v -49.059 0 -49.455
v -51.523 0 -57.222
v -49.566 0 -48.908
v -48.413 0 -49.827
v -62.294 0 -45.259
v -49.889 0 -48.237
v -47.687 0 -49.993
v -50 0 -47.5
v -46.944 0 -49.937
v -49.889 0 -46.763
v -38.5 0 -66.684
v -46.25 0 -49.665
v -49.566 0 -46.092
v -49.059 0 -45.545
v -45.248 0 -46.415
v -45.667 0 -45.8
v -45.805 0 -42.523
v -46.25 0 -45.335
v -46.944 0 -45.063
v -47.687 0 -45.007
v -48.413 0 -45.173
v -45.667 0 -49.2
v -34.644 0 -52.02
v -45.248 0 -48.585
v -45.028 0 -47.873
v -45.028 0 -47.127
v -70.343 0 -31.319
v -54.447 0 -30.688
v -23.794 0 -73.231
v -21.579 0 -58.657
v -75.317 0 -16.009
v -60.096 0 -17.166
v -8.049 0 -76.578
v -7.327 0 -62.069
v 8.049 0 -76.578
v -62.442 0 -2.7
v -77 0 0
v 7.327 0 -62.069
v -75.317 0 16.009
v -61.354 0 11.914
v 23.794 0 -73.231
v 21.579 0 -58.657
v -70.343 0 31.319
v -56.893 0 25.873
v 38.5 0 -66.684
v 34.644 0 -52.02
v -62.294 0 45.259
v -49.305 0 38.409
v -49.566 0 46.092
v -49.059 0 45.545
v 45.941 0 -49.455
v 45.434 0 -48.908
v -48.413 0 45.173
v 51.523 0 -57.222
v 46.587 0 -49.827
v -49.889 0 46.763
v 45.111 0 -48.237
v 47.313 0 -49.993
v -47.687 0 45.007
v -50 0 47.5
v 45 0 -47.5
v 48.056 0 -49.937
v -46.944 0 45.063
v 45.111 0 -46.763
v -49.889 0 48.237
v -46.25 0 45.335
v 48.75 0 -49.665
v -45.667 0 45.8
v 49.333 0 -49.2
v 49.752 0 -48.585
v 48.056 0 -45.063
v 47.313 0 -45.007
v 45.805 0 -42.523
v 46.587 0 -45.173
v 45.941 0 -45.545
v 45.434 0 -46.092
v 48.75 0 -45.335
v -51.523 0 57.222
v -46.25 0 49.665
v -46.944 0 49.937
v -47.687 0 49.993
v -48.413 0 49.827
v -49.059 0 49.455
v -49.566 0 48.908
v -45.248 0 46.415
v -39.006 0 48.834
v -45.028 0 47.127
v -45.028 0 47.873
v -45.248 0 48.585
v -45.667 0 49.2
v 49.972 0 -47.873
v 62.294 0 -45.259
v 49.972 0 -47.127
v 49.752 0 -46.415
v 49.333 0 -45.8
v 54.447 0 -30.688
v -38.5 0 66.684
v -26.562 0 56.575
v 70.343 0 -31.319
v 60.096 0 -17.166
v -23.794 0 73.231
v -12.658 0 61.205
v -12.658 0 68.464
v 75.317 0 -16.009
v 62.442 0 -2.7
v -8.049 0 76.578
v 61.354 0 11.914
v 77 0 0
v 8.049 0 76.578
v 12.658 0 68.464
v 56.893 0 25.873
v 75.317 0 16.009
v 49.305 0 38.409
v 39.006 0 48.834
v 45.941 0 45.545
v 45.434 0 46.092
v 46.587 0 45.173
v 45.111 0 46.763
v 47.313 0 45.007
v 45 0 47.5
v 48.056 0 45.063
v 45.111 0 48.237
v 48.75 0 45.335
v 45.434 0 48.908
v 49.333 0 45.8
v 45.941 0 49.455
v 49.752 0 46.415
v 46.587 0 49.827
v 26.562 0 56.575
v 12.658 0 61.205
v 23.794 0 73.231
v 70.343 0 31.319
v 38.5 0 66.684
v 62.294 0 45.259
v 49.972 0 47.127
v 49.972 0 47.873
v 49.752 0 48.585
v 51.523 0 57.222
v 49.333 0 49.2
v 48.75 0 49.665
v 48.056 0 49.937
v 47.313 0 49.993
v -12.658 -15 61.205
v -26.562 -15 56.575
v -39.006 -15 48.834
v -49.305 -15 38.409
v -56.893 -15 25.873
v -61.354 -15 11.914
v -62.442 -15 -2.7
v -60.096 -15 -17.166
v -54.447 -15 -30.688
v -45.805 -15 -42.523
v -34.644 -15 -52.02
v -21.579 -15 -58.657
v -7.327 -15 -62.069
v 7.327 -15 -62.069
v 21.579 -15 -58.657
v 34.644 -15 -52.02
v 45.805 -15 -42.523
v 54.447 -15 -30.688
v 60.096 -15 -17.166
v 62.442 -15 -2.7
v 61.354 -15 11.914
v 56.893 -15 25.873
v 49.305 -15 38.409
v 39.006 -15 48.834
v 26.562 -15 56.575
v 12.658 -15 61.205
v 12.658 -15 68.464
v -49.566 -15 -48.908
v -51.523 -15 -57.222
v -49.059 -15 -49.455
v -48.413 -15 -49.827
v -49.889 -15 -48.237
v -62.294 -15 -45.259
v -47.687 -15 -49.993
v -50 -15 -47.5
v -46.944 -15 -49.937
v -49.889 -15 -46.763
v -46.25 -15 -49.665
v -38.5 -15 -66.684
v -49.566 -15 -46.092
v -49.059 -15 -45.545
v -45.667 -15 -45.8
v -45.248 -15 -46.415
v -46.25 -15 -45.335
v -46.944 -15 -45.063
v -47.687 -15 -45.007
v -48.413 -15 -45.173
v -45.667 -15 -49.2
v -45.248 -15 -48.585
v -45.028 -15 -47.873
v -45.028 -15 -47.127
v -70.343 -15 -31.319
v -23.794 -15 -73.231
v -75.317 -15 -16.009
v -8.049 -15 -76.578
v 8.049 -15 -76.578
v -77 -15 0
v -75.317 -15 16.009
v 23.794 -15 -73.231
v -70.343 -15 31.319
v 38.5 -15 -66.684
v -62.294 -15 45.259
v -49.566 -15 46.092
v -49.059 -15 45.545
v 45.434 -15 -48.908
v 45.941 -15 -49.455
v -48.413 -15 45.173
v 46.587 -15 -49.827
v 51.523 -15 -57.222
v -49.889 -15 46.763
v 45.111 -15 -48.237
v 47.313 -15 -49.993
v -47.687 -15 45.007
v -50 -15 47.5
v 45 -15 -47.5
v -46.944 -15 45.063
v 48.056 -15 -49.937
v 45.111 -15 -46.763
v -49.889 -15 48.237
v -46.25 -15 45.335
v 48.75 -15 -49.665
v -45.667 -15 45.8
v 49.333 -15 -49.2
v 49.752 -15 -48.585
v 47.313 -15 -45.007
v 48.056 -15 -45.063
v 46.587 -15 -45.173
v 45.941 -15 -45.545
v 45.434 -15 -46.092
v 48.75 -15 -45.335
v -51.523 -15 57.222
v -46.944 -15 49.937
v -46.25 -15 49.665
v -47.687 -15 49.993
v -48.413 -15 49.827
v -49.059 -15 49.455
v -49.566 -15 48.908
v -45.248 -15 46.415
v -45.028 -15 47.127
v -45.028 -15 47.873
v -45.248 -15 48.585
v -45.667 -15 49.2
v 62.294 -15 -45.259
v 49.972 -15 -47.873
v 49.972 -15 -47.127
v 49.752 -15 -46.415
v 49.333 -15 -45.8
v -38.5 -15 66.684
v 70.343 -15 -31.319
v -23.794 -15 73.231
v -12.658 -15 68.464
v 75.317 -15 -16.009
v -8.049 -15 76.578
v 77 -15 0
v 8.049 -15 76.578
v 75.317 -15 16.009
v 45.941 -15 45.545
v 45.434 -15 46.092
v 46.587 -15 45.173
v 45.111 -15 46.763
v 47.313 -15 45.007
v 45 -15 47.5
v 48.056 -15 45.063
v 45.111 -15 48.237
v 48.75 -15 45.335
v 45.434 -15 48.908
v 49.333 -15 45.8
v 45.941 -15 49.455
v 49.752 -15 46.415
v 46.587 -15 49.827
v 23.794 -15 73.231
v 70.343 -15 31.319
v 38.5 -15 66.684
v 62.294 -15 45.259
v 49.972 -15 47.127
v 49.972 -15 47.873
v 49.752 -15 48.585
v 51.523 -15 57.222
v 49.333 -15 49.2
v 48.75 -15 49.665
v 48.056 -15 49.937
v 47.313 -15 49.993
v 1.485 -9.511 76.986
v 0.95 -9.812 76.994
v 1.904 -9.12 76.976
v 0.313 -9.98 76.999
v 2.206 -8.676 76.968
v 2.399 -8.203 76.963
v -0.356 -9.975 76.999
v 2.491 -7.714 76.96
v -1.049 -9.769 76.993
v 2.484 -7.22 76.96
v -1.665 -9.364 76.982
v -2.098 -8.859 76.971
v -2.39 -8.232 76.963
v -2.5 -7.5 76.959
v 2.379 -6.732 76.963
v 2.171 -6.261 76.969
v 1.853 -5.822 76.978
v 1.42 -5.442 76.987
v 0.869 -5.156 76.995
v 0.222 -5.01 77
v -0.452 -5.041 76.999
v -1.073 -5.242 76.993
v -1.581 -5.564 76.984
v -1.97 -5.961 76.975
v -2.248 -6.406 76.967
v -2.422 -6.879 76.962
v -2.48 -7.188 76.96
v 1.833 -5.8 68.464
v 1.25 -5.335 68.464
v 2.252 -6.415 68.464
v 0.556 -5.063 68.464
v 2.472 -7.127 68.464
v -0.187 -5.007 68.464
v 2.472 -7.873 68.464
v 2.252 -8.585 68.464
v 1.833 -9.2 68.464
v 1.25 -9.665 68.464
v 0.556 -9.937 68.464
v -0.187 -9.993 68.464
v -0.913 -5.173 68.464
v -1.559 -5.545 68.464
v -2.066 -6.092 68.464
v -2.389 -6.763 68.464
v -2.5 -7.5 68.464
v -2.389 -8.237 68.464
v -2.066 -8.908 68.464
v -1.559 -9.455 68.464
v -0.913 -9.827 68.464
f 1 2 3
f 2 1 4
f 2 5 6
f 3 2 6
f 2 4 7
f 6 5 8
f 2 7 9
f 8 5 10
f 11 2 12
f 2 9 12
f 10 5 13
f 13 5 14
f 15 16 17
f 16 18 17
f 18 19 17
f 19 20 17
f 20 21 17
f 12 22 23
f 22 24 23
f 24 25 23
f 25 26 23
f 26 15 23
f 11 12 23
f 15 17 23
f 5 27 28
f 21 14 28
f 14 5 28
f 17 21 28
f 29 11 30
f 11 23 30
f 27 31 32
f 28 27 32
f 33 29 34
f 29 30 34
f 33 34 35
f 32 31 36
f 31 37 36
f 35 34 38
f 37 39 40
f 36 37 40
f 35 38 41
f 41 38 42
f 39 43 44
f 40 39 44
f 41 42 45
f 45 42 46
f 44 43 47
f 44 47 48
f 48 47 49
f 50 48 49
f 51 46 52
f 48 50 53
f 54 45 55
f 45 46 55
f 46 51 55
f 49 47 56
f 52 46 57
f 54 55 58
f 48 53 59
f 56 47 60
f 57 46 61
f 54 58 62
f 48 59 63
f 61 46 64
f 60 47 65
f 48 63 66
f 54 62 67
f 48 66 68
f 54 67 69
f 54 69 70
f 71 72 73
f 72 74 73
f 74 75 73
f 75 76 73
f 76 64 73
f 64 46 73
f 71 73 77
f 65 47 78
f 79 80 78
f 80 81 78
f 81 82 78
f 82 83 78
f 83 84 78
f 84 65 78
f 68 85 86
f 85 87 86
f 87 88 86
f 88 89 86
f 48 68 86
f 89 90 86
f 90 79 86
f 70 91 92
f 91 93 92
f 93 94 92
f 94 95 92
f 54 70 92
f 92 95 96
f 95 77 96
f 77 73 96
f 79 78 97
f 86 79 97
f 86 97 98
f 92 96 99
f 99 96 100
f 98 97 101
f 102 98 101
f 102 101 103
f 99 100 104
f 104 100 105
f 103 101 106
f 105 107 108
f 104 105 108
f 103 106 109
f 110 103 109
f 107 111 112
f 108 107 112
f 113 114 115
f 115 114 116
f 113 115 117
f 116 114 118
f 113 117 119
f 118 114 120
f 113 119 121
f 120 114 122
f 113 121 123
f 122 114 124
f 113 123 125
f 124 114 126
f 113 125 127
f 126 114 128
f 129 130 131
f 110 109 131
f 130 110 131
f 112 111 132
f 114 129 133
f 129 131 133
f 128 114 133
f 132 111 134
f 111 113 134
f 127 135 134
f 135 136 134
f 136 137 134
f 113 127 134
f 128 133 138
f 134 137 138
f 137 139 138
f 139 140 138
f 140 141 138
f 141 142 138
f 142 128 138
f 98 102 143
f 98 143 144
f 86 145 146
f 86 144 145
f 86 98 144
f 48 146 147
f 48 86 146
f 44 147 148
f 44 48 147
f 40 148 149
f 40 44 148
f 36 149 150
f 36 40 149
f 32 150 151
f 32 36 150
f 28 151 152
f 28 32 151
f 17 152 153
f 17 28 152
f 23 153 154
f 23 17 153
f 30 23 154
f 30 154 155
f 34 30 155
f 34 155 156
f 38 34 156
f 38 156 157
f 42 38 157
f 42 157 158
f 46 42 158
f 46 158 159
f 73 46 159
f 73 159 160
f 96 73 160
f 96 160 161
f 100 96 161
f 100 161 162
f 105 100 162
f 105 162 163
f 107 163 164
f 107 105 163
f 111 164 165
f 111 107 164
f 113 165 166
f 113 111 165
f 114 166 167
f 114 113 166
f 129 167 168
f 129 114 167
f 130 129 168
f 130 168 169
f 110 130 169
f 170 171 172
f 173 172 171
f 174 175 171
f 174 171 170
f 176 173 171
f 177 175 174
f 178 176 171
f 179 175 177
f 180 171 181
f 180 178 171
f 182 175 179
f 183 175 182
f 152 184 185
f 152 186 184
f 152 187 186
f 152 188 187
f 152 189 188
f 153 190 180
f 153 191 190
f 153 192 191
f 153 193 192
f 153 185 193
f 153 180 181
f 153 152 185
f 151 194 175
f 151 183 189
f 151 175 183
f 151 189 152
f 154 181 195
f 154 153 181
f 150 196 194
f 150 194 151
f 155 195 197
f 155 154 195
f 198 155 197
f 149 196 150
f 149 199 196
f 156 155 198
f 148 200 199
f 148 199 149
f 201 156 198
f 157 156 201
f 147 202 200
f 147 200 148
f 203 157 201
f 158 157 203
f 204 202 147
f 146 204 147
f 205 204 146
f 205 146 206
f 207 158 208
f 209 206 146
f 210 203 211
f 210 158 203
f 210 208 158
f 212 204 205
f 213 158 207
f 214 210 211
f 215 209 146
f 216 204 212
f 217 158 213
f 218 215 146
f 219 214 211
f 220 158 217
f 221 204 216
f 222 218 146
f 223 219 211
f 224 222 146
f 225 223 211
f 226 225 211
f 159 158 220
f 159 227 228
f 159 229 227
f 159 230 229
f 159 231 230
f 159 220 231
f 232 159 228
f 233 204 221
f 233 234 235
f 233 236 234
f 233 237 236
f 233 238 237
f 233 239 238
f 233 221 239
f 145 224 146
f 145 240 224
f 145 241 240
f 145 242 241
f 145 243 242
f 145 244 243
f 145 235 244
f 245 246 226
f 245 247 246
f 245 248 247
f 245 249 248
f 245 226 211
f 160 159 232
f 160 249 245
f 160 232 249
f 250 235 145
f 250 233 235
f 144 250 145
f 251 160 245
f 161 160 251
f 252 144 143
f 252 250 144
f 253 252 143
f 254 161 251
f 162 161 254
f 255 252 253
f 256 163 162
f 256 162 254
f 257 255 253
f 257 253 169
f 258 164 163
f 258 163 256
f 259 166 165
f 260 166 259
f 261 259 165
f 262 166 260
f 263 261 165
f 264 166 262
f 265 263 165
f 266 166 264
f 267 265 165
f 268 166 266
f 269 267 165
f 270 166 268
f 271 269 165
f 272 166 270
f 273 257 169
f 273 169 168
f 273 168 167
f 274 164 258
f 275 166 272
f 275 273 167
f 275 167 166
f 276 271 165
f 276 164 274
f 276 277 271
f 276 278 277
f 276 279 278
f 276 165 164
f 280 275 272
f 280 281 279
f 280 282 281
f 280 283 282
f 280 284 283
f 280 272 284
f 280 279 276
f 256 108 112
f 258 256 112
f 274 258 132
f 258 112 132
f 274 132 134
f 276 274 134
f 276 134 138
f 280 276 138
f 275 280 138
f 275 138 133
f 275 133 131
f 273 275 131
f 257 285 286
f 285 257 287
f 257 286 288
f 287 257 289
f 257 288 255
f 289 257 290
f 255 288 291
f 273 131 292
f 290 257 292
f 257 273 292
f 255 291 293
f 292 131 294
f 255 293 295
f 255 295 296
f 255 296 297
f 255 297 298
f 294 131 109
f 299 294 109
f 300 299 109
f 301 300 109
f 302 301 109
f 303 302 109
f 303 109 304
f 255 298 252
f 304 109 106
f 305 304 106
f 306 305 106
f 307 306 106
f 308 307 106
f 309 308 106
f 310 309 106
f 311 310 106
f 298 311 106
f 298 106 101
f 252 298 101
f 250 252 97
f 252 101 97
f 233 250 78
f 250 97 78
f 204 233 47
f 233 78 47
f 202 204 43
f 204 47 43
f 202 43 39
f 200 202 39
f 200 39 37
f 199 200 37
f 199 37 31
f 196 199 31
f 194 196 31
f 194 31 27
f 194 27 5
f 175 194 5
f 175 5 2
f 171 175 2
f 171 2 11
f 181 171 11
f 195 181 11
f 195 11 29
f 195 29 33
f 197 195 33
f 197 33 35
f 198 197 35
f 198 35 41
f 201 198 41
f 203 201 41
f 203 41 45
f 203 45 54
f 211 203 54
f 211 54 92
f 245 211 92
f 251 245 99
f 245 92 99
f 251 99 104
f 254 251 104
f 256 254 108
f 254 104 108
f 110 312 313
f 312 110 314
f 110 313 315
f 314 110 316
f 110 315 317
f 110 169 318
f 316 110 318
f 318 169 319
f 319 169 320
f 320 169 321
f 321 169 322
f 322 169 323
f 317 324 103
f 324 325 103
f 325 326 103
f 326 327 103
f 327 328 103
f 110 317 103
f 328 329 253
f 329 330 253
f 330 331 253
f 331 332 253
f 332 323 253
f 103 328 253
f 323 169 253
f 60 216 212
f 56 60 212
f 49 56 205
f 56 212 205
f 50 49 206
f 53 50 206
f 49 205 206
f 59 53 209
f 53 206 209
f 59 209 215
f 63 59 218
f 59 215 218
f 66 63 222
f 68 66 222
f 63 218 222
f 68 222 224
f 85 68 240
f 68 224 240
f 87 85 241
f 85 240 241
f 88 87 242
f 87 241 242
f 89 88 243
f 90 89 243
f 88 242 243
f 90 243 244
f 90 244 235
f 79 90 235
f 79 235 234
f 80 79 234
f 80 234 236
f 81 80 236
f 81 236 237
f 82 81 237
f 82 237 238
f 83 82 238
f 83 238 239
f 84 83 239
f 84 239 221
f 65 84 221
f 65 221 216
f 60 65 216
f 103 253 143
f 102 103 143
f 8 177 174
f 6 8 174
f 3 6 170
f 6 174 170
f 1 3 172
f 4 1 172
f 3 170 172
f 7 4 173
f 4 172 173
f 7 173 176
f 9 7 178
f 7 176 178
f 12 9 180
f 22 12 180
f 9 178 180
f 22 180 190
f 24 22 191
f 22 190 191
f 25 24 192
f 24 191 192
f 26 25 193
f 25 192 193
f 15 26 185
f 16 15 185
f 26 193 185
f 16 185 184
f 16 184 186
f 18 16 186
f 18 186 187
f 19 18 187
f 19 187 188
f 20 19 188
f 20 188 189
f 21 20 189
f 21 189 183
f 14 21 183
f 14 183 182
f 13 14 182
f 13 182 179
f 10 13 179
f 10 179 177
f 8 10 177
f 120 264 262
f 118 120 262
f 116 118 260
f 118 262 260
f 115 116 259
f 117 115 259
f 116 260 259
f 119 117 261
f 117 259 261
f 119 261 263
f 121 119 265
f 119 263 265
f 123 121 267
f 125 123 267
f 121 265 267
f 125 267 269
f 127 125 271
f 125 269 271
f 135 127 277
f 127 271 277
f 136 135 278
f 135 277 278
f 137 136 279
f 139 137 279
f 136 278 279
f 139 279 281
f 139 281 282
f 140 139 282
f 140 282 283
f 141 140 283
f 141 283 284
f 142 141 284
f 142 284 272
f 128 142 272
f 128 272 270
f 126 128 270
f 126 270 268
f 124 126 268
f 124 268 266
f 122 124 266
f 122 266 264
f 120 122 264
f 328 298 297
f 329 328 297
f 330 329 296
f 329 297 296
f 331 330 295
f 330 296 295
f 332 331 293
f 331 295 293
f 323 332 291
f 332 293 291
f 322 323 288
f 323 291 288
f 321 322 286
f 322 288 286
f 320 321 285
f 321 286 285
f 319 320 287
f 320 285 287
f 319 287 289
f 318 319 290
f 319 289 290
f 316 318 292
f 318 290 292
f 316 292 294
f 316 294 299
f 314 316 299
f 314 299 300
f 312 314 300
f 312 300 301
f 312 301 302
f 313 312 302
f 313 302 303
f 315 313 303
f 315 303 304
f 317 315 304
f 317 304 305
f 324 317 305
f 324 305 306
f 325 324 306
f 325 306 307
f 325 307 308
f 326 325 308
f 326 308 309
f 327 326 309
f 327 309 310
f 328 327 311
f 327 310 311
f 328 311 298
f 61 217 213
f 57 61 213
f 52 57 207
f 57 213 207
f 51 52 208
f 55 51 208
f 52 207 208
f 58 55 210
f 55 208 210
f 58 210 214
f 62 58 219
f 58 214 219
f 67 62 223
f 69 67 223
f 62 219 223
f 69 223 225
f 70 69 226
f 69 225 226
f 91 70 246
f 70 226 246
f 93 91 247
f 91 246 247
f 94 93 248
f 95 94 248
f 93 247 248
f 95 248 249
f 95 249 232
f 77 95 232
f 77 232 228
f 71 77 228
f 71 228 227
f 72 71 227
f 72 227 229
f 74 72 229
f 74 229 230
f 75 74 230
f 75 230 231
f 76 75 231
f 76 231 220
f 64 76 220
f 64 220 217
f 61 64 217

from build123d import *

# Parameters (mm, degrees)
F0_R     = 77
F0_R_2   = 62.5
F1_DEPTH = 15
F3_D     = 5
F5_DEPTH = 25
F7_D     = 5
F7_DEPTH = 12


with BuildPart() as f1:
    # F0 (on Front) → F1 (new body)
    with BuildSketch(Plane.XZ):
        Circle(F0_R)
        Circle(F0_R_2, mode=Mode.SUBTRACT)
    extrude(amount=F1_DEPTH)

    # F3 (through all)
    with Locations(Plane(origin=(0, 0, 0), x_dir=(1, 0, 0), z_dir=(0, 1, 0))):
        with Locations((-47.5, 47.5), (47.5, 47.5), (47.5, -47.5), (-47.5, -47.5)):
            Hole(F3_D / 2)

    # F4 (on face) → F5 (cut)
    with BuildSketch(Plane.XZ.offset(15)):
        with BuildLine():
            Line((12.658332, 68.463892), (-12.658332, 68.463892))
            Line((-12.658332, 68.463892), (-12.658332, 61.204711))
            ThreePointArc((-12.658332, 61.204711), (0, 62.5), (12.658332, 61.204711))
            Line((12.658332, 61.204711), (12.658332, 68.463892))
        make_face()
    extrude(amount=-F5_DEPTH, mode=Mode.SUBTRACT)

    # F7
    with Locations(Plane(origin=(0, 0, 68.463892), x_dir=(1, 0, 0), z_dir=(0, 0, -1))):
        with Locations((0, 7.5)):
            Hole(F7_D / 2, depth=F7_DEPTH)


solid = f1.part
